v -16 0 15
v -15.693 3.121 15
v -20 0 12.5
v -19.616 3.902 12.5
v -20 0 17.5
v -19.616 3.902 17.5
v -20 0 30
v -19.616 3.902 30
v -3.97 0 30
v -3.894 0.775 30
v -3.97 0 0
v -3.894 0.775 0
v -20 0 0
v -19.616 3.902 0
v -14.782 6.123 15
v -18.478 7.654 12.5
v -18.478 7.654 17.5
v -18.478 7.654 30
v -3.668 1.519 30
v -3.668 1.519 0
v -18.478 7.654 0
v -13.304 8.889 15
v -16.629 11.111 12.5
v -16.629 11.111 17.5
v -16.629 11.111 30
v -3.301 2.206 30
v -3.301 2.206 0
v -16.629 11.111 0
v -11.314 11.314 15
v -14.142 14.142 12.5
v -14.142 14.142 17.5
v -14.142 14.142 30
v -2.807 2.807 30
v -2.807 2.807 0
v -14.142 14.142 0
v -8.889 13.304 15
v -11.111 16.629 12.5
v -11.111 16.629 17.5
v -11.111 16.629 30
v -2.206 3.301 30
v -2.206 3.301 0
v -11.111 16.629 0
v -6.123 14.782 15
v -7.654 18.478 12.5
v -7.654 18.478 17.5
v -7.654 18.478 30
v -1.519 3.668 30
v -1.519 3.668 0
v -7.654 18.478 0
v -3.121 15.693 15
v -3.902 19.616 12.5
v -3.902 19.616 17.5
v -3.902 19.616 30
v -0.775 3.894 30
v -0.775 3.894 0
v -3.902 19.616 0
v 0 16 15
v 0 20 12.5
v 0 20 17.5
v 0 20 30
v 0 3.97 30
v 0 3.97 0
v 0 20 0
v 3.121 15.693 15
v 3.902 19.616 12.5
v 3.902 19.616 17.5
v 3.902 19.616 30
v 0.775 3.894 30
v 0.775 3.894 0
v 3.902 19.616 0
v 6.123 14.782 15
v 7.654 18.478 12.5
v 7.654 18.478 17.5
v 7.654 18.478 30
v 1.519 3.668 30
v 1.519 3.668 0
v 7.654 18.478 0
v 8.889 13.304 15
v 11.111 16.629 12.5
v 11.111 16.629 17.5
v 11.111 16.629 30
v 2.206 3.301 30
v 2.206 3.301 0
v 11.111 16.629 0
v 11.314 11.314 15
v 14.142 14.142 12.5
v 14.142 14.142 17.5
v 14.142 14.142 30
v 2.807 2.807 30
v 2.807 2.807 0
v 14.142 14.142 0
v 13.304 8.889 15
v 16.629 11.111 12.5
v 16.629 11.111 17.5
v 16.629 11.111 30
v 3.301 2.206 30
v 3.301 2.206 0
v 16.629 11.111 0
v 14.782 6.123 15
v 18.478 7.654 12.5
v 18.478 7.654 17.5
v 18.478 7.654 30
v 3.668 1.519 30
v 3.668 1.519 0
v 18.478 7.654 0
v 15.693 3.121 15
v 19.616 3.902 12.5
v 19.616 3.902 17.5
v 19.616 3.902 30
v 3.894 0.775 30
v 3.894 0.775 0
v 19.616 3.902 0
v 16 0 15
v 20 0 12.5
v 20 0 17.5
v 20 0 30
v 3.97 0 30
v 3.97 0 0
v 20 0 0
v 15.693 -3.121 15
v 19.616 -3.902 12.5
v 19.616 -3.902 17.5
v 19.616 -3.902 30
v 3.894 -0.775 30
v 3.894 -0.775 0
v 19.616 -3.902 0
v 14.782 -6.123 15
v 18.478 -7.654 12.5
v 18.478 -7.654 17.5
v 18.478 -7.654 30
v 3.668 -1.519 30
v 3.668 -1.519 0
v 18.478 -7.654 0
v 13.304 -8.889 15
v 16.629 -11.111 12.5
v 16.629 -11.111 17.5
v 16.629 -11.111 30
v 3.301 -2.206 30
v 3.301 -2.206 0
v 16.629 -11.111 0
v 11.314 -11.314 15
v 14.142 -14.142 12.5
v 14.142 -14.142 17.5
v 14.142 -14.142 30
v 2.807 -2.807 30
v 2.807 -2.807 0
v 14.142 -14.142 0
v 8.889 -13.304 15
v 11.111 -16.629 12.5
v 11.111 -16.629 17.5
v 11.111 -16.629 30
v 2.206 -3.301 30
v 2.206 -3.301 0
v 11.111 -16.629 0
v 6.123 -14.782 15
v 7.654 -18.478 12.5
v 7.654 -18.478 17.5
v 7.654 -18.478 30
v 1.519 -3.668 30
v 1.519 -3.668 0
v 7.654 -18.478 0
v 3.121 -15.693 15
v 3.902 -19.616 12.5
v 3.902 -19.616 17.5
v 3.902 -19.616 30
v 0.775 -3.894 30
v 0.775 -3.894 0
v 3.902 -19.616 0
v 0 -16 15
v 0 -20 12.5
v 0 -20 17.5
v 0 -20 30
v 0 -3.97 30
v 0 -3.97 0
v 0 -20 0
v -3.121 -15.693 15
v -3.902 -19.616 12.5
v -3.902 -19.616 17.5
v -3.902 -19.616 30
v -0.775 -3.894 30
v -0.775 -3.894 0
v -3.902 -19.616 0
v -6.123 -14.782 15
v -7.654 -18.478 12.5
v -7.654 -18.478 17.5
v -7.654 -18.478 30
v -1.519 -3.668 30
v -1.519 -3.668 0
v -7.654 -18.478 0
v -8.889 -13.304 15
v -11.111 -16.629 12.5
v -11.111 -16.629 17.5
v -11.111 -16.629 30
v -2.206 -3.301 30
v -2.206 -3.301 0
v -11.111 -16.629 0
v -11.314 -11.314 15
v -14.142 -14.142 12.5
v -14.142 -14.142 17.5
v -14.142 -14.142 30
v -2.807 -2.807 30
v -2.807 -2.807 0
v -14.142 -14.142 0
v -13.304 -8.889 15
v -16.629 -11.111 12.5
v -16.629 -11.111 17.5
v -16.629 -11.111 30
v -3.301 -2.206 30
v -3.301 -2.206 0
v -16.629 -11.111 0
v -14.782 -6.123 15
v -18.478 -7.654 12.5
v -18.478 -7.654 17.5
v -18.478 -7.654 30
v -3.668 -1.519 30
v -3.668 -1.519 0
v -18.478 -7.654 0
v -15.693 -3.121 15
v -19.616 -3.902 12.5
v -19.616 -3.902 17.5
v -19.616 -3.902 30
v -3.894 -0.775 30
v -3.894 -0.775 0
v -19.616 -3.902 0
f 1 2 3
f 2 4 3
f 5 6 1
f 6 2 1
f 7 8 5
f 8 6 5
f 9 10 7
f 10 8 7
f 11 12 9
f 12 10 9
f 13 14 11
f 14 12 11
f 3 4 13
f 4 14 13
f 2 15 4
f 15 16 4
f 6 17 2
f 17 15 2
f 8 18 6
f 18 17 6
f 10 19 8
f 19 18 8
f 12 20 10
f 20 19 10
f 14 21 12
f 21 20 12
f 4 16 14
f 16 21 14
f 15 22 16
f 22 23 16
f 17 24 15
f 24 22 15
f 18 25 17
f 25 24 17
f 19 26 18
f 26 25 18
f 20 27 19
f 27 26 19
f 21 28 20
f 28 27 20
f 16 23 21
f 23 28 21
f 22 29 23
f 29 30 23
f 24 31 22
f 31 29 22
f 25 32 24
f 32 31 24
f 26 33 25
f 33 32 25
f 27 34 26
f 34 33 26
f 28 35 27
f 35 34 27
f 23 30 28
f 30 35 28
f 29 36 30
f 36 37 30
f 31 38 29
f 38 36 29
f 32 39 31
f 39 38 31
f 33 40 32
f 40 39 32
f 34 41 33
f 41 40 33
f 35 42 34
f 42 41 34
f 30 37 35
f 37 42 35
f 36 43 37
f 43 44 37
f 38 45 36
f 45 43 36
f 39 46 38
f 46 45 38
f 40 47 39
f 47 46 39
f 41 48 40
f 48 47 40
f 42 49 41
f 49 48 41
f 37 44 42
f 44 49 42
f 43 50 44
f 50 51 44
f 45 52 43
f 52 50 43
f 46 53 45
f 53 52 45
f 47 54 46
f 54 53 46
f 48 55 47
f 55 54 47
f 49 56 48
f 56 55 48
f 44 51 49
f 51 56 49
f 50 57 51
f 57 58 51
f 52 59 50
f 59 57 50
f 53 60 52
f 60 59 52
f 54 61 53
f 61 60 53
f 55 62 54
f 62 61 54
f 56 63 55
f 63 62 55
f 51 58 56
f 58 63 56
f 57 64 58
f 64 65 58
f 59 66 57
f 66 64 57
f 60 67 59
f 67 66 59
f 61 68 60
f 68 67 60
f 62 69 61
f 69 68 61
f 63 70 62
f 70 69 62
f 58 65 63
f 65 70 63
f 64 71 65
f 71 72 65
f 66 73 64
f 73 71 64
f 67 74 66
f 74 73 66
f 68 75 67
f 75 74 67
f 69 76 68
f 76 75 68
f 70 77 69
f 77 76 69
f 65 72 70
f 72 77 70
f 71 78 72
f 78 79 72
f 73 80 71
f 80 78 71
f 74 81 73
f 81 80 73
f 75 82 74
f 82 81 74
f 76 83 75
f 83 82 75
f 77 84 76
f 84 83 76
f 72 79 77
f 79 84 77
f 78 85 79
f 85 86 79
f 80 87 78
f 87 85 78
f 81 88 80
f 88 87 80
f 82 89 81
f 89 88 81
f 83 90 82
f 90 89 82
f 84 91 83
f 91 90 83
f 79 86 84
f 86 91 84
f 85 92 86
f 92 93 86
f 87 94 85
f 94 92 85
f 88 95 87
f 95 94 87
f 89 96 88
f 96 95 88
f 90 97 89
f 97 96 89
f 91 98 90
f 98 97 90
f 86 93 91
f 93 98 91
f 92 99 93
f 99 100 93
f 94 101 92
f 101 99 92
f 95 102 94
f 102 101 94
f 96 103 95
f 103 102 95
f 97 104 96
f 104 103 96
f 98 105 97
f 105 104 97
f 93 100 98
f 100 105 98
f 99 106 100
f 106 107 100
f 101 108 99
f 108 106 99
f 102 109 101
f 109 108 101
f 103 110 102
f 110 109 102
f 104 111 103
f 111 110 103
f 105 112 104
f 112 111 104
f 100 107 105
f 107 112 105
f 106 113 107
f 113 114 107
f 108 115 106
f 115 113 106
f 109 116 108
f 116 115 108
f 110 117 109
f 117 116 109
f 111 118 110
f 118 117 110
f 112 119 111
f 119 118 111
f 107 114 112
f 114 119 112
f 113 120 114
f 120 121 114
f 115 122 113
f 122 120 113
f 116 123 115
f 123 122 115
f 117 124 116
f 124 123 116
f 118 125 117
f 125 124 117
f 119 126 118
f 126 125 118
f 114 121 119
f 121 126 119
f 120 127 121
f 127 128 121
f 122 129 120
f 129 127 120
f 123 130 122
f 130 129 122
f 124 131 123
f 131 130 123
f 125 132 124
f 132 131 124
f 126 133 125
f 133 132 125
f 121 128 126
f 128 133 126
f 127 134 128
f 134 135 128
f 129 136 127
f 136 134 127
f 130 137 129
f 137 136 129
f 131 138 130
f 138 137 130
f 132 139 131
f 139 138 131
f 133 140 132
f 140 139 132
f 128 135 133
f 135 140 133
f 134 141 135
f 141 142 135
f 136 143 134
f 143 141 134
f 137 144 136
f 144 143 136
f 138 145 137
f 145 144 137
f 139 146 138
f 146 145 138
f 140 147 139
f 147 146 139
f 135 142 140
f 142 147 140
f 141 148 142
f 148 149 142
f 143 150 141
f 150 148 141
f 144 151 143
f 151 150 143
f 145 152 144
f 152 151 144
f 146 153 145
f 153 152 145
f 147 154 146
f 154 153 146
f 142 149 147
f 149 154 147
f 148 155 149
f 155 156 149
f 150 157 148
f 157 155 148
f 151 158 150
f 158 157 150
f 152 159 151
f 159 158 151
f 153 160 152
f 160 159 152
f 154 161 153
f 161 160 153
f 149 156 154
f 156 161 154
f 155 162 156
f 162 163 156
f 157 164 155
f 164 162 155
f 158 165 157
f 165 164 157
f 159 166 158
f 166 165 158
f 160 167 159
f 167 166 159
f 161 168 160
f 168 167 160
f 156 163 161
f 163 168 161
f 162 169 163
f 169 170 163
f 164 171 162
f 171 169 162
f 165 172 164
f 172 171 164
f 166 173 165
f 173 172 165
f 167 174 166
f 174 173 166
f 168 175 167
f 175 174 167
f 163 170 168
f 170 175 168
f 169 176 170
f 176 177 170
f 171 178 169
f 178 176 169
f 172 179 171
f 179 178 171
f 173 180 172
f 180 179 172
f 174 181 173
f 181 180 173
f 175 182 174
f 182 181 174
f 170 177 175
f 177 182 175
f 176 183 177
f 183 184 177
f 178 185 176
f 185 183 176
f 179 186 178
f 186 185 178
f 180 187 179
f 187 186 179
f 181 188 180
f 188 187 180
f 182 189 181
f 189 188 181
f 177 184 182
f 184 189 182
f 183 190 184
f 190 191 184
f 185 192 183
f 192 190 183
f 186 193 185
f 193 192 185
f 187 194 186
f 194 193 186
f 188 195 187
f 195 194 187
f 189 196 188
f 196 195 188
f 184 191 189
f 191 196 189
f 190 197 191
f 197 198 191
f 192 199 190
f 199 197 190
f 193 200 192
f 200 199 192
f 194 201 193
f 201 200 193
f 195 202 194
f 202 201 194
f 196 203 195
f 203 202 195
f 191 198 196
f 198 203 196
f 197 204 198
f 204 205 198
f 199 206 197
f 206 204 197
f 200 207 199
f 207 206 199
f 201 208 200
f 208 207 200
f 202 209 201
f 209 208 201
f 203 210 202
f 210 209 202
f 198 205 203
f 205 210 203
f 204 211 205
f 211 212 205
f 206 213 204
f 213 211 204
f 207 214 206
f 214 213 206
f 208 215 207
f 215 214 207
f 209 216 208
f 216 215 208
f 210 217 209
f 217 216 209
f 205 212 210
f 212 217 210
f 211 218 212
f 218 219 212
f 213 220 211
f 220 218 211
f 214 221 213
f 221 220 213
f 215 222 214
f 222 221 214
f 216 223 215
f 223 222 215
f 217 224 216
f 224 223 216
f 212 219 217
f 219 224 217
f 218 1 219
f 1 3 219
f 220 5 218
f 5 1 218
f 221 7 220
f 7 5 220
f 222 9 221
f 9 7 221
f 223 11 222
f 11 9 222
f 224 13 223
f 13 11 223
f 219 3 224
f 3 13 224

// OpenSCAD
$fn = 32;

// ----------------------------------------------------------------------
// Belt roller: 40 mm barrel, 30 mm wide, bore 7.94 mm
// ----------------------------------------------------------------------

// --- parameters (mm) ---
bore_d = 7.94;            // bore
barrel_d = 40;            // barrel diameter
roller_w = 30;            // roller width
groove_w = 5;             // guide groove width
groove_d = 4;             // guide groove depth

roller_profile = [[3.97, 0], [20, 0], [20, 12.5], [16, 15], [20, 17.5], [20, 30], [3.97, 30]];

/* the profile stays clear of the axis, so the bore comes out of the revolve */
rotate_extrude() polygon(roller_profile);
